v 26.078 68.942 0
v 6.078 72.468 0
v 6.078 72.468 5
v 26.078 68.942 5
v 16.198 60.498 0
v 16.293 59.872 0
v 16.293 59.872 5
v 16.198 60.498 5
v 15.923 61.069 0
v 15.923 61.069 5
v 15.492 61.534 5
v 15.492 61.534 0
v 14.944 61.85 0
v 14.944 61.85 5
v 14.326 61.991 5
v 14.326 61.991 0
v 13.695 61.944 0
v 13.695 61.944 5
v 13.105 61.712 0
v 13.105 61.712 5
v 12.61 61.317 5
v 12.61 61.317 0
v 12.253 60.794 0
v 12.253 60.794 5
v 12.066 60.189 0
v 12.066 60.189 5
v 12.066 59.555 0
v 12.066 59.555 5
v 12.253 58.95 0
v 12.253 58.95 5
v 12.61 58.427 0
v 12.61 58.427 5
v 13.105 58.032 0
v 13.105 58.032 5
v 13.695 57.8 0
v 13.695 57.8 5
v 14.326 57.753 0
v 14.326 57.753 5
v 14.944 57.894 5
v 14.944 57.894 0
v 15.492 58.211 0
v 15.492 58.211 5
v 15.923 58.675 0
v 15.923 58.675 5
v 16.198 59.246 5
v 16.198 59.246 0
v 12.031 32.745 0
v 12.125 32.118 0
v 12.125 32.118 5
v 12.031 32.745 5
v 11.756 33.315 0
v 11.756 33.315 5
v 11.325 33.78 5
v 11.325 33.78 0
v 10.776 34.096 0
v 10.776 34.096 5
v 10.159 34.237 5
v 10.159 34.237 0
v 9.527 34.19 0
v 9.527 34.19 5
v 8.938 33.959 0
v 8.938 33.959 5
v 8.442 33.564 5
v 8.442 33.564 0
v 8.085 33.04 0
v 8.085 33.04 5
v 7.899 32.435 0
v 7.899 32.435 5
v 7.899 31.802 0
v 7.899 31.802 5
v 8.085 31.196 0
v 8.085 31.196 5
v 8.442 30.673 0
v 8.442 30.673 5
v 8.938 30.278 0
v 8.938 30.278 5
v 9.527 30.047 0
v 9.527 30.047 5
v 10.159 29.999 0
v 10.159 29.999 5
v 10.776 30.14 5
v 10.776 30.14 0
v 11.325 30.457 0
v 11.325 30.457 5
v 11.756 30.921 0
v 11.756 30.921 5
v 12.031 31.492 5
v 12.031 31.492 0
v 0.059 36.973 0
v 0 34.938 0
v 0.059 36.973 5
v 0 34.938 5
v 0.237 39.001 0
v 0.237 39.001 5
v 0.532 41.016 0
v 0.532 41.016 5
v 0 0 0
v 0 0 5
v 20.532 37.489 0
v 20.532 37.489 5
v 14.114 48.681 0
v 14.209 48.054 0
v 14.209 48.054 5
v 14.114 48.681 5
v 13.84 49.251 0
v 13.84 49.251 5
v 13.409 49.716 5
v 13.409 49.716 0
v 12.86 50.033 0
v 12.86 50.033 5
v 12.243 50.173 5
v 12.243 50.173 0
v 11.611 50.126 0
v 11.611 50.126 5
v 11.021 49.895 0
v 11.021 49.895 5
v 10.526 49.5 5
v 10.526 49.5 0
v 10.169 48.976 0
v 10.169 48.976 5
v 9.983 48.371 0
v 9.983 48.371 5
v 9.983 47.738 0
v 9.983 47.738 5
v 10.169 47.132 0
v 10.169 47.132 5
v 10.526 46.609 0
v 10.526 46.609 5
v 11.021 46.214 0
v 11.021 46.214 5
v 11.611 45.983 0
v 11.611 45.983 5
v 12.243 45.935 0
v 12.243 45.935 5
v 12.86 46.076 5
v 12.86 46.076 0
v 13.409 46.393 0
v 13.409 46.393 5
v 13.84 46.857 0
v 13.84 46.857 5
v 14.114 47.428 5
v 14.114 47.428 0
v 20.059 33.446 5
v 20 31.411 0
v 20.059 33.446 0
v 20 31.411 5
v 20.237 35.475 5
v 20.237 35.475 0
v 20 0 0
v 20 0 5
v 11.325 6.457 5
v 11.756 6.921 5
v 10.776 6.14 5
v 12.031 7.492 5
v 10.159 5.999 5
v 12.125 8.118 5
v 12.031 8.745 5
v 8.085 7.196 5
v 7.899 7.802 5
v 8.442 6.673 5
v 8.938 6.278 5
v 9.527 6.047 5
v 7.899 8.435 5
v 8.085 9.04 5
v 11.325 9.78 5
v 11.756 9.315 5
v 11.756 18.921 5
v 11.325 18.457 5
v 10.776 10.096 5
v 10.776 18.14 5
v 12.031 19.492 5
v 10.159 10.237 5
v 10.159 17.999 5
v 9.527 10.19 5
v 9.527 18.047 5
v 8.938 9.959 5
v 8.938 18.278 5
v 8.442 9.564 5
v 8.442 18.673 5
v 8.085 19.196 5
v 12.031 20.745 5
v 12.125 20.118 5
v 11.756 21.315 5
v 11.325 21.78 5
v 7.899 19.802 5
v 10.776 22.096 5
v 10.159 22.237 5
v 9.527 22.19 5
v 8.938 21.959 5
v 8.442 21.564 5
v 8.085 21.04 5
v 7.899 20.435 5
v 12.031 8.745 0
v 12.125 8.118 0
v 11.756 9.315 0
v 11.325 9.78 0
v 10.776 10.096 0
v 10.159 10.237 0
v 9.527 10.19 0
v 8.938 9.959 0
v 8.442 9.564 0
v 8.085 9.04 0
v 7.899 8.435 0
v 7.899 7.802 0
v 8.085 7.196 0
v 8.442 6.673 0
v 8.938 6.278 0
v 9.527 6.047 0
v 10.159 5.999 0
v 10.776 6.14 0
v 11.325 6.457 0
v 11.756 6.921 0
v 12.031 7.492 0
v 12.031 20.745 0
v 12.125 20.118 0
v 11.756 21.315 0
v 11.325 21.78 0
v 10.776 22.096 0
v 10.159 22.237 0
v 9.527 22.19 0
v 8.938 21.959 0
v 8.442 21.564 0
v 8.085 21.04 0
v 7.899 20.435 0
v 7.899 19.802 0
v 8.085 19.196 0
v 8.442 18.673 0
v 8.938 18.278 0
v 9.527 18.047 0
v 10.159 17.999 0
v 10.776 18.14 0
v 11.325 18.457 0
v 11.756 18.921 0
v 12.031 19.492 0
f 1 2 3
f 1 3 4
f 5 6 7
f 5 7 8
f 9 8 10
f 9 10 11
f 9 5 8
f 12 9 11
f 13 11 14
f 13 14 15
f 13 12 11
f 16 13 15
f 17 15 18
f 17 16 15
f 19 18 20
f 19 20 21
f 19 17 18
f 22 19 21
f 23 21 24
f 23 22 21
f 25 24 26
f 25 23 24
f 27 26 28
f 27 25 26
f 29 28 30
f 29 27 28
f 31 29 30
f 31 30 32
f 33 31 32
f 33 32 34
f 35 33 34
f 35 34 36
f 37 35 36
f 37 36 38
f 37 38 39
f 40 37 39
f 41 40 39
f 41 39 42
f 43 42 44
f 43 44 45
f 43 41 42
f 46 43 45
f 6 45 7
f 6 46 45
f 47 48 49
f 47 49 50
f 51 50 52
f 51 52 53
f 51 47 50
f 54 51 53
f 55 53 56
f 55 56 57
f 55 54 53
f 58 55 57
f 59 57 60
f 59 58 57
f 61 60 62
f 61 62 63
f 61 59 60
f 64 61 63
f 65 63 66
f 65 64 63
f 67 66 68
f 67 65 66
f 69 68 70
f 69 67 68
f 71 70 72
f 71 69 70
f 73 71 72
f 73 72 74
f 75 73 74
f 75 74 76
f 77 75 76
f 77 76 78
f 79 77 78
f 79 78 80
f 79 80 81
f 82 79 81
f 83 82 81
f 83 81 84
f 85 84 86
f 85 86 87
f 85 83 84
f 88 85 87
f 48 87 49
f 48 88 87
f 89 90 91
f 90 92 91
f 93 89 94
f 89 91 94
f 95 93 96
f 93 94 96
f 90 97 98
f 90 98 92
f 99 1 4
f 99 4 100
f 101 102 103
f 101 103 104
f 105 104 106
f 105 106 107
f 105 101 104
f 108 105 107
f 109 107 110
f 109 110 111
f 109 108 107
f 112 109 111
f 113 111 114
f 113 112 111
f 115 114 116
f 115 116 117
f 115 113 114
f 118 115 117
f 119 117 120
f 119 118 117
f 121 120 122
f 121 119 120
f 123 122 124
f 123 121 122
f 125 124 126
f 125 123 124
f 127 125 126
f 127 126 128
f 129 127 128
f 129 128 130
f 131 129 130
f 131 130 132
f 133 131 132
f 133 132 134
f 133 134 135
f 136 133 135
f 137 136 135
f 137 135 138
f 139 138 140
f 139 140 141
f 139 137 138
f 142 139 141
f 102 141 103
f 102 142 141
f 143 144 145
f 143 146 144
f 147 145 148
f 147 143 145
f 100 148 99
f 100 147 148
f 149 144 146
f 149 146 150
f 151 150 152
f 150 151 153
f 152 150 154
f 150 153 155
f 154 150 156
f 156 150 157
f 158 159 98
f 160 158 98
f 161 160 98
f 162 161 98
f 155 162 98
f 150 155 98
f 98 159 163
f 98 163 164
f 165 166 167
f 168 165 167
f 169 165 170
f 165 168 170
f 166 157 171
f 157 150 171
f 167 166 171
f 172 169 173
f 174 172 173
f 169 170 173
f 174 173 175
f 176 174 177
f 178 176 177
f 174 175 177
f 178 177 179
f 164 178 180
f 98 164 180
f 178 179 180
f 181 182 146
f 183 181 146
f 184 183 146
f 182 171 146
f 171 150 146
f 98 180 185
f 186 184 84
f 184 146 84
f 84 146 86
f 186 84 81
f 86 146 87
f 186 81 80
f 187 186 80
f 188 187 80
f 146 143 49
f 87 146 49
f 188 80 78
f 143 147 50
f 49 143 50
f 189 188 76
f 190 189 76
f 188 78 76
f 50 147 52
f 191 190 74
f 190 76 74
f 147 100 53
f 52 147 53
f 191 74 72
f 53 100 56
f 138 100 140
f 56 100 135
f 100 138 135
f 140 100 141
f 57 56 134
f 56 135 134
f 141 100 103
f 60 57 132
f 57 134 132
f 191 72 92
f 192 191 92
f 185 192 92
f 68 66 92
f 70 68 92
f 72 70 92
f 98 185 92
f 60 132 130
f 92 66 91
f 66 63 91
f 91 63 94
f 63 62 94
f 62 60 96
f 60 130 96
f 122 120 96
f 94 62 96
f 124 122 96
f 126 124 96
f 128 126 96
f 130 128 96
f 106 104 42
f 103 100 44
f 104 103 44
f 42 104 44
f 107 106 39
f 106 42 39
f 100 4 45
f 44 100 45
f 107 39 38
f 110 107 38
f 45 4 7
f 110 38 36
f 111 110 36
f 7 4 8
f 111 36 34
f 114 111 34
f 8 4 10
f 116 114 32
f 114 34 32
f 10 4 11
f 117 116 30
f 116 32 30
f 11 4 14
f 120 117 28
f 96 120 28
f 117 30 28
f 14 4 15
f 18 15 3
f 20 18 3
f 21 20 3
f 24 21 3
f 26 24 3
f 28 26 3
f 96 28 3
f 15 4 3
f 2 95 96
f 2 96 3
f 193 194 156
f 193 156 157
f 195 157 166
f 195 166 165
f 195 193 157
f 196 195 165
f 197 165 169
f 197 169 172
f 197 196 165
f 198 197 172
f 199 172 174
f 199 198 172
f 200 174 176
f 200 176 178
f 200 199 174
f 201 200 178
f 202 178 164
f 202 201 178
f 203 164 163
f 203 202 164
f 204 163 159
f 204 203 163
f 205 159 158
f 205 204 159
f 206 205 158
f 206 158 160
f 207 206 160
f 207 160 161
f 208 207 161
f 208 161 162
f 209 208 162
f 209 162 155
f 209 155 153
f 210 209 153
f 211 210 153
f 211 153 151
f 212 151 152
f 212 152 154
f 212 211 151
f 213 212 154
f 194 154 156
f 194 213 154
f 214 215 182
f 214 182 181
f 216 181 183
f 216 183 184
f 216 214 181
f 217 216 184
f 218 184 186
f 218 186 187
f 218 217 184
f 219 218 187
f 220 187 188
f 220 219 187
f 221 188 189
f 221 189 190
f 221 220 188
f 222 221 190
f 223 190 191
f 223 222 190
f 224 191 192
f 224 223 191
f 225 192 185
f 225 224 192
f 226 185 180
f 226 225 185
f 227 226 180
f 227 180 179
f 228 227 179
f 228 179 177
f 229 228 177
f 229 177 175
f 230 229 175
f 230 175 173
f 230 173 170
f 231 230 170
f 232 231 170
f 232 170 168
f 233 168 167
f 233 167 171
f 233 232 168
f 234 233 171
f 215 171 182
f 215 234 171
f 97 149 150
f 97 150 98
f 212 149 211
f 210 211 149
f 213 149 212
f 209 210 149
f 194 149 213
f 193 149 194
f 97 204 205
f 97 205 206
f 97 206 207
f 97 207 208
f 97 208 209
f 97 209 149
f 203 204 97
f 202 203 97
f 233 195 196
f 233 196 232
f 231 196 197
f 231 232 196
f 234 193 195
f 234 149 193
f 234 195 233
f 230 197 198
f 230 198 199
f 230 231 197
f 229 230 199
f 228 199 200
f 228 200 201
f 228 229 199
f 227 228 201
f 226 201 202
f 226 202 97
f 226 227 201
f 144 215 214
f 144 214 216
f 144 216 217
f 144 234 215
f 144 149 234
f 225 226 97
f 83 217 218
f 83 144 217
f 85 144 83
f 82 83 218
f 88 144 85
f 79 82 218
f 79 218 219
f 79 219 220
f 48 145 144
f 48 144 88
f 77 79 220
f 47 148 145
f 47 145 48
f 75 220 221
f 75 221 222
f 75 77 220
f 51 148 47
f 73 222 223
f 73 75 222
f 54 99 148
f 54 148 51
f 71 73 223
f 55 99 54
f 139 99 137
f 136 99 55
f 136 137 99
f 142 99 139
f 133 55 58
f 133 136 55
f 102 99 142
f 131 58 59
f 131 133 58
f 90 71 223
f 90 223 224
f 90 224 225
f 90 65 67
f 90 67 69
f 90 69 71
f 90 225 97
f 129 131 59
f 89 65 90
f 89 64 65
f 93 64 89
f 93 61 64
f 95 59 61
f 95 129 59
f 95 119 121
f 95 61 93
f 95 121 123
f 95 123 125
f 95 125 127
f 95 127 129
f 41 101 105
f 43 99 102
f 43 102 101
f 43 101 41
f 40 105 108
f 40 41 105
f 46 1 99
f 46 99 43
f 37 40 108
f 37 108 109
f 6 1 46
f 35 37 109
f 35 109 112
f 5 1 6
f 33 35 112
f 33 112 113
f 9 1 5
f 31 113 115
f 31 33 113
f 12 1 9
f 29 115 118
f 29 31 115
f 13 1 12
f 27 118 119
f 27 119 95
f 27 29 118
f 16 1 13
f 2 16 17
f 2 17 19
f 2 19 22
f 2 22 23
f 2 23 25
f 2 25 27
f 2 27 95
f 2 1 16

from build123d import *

# Parameters (mm, degrees)
SKETCH_1_R      = 2.125
EXTRUDE_1_DEPTH = 5
FILLET_1_R      = 35


with BuildPart() as part:
    # 草图1 → 凸台-拉伸1 (new body)
    with BuildSketch(Plane.XY):
        Polygon((0, 0), (0, 38), (6.077686218, 72.468271355), (26.077686218, 68.941731741), (20, 34.473460386), (20, 0), align=None)
        with Locations((10, 32.118365096)):
            Circle(SKETCH_1_R, mode=Mode.SUBTRACT)
        with Locations((10, 20.118365096)):
            Circle(SKETCH_1_R, mode=Mode.SUBTRACT)
        with Locations((10, 8.118365096)):
            Circle(SKETCH_1_R, mode=Mode.SUBTRACT)
        with Locations((14.167556264, 59.872116265)):
            Circle(SKETCH_1_R, mode=Mode.SUBTRACT)
        with Locations((12.083778132, 48.054423229)):
            Circle(SKETCH_1_R, mode=Mode.SUBTRACT)
    extrude(amount=EXTRUDE_1_DEPTH)

    # 圆角1
    fillet_1_edges = [part.edges().sort_by_distance(p)[0] for p in [
        (0, 38, 2.5),
        (20, 34.473460386, 2.5),
    ]]
    fillet(fillet_1_edges, radius=FILLET_1_R)


solid = part.part
